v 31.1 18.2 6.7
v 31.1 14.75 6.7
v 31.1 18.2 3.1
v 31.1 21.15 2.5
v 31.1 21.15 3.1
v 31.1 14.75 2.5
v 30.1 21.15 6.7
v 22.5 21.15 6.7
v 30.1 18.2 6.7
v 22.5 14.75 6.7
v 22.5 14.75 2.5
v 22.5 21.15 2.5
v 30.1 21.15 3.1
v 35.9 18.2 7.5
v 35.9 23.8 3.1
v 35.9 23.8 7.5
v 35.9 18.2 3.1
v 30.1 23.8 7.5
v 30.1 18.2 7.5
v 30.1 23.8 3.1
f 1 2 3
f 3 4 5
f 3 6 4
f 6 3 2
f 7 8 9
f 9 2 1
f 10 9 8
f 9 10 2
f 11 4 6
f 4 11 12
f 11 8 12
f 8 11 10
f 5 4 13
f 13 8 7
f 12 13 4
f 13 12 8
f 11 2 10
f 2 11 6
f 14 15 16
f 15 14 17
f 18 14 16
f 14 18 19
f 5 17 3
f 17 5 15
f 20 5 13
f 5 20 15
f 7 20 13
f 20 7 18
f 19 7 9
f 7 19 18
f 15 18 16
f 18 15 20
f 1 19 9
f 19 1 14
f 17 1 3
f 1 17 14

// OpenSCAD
union() {
  translate([22.5, 14.75, 2.5]) cube(size=[8.6,6.4,4.2], center=false);
  translate([30.1, 18.2, 3.1]) cube(size=[5.8,5.6,4.4], center=false);
}
